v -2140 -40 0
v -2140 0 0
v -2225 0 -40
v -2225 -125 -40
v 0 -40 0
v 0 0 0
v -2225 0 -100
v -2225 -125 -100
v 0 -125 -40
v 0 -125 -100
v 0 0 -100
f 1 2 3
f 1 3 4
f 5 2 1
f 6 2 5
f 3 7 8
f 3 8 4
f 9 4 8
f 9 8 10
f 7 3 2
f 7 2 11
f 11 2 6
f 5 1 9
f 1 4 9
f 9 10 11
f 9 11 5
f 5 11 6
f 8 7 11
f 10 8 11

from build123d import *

# Parameters (mm, degrees)
F0_W     = 2225
F0_H     = 100
F1_DEPTH = 125
F2_SIZE2 = 40
F2_SIZE  = 85


with BuildPart() as f1:
    # F0 (on Front) → F1 (new body)
    with BuildSketch(Plane.XZ):
        with Locations((-1112.5, -50)):
            Rectangle(F0_W, F0_H)
    extrude(amount=F1_DEPTH)

    # F2
    f2_edges = [f1.edges().sort_by_distance(p)[0] for p in [
        (-1112.5, -125, 0),
        (-2225, -62.5, 0),
    ]]
    f2_side = f1.faces().sort_by_distance((-1112.5, -62.5, 0))[0]
    chamfer(f2_edges, length=F2_SIZE, length2=F2_SIZE2, reference=f2_side)


solid = f1.part
